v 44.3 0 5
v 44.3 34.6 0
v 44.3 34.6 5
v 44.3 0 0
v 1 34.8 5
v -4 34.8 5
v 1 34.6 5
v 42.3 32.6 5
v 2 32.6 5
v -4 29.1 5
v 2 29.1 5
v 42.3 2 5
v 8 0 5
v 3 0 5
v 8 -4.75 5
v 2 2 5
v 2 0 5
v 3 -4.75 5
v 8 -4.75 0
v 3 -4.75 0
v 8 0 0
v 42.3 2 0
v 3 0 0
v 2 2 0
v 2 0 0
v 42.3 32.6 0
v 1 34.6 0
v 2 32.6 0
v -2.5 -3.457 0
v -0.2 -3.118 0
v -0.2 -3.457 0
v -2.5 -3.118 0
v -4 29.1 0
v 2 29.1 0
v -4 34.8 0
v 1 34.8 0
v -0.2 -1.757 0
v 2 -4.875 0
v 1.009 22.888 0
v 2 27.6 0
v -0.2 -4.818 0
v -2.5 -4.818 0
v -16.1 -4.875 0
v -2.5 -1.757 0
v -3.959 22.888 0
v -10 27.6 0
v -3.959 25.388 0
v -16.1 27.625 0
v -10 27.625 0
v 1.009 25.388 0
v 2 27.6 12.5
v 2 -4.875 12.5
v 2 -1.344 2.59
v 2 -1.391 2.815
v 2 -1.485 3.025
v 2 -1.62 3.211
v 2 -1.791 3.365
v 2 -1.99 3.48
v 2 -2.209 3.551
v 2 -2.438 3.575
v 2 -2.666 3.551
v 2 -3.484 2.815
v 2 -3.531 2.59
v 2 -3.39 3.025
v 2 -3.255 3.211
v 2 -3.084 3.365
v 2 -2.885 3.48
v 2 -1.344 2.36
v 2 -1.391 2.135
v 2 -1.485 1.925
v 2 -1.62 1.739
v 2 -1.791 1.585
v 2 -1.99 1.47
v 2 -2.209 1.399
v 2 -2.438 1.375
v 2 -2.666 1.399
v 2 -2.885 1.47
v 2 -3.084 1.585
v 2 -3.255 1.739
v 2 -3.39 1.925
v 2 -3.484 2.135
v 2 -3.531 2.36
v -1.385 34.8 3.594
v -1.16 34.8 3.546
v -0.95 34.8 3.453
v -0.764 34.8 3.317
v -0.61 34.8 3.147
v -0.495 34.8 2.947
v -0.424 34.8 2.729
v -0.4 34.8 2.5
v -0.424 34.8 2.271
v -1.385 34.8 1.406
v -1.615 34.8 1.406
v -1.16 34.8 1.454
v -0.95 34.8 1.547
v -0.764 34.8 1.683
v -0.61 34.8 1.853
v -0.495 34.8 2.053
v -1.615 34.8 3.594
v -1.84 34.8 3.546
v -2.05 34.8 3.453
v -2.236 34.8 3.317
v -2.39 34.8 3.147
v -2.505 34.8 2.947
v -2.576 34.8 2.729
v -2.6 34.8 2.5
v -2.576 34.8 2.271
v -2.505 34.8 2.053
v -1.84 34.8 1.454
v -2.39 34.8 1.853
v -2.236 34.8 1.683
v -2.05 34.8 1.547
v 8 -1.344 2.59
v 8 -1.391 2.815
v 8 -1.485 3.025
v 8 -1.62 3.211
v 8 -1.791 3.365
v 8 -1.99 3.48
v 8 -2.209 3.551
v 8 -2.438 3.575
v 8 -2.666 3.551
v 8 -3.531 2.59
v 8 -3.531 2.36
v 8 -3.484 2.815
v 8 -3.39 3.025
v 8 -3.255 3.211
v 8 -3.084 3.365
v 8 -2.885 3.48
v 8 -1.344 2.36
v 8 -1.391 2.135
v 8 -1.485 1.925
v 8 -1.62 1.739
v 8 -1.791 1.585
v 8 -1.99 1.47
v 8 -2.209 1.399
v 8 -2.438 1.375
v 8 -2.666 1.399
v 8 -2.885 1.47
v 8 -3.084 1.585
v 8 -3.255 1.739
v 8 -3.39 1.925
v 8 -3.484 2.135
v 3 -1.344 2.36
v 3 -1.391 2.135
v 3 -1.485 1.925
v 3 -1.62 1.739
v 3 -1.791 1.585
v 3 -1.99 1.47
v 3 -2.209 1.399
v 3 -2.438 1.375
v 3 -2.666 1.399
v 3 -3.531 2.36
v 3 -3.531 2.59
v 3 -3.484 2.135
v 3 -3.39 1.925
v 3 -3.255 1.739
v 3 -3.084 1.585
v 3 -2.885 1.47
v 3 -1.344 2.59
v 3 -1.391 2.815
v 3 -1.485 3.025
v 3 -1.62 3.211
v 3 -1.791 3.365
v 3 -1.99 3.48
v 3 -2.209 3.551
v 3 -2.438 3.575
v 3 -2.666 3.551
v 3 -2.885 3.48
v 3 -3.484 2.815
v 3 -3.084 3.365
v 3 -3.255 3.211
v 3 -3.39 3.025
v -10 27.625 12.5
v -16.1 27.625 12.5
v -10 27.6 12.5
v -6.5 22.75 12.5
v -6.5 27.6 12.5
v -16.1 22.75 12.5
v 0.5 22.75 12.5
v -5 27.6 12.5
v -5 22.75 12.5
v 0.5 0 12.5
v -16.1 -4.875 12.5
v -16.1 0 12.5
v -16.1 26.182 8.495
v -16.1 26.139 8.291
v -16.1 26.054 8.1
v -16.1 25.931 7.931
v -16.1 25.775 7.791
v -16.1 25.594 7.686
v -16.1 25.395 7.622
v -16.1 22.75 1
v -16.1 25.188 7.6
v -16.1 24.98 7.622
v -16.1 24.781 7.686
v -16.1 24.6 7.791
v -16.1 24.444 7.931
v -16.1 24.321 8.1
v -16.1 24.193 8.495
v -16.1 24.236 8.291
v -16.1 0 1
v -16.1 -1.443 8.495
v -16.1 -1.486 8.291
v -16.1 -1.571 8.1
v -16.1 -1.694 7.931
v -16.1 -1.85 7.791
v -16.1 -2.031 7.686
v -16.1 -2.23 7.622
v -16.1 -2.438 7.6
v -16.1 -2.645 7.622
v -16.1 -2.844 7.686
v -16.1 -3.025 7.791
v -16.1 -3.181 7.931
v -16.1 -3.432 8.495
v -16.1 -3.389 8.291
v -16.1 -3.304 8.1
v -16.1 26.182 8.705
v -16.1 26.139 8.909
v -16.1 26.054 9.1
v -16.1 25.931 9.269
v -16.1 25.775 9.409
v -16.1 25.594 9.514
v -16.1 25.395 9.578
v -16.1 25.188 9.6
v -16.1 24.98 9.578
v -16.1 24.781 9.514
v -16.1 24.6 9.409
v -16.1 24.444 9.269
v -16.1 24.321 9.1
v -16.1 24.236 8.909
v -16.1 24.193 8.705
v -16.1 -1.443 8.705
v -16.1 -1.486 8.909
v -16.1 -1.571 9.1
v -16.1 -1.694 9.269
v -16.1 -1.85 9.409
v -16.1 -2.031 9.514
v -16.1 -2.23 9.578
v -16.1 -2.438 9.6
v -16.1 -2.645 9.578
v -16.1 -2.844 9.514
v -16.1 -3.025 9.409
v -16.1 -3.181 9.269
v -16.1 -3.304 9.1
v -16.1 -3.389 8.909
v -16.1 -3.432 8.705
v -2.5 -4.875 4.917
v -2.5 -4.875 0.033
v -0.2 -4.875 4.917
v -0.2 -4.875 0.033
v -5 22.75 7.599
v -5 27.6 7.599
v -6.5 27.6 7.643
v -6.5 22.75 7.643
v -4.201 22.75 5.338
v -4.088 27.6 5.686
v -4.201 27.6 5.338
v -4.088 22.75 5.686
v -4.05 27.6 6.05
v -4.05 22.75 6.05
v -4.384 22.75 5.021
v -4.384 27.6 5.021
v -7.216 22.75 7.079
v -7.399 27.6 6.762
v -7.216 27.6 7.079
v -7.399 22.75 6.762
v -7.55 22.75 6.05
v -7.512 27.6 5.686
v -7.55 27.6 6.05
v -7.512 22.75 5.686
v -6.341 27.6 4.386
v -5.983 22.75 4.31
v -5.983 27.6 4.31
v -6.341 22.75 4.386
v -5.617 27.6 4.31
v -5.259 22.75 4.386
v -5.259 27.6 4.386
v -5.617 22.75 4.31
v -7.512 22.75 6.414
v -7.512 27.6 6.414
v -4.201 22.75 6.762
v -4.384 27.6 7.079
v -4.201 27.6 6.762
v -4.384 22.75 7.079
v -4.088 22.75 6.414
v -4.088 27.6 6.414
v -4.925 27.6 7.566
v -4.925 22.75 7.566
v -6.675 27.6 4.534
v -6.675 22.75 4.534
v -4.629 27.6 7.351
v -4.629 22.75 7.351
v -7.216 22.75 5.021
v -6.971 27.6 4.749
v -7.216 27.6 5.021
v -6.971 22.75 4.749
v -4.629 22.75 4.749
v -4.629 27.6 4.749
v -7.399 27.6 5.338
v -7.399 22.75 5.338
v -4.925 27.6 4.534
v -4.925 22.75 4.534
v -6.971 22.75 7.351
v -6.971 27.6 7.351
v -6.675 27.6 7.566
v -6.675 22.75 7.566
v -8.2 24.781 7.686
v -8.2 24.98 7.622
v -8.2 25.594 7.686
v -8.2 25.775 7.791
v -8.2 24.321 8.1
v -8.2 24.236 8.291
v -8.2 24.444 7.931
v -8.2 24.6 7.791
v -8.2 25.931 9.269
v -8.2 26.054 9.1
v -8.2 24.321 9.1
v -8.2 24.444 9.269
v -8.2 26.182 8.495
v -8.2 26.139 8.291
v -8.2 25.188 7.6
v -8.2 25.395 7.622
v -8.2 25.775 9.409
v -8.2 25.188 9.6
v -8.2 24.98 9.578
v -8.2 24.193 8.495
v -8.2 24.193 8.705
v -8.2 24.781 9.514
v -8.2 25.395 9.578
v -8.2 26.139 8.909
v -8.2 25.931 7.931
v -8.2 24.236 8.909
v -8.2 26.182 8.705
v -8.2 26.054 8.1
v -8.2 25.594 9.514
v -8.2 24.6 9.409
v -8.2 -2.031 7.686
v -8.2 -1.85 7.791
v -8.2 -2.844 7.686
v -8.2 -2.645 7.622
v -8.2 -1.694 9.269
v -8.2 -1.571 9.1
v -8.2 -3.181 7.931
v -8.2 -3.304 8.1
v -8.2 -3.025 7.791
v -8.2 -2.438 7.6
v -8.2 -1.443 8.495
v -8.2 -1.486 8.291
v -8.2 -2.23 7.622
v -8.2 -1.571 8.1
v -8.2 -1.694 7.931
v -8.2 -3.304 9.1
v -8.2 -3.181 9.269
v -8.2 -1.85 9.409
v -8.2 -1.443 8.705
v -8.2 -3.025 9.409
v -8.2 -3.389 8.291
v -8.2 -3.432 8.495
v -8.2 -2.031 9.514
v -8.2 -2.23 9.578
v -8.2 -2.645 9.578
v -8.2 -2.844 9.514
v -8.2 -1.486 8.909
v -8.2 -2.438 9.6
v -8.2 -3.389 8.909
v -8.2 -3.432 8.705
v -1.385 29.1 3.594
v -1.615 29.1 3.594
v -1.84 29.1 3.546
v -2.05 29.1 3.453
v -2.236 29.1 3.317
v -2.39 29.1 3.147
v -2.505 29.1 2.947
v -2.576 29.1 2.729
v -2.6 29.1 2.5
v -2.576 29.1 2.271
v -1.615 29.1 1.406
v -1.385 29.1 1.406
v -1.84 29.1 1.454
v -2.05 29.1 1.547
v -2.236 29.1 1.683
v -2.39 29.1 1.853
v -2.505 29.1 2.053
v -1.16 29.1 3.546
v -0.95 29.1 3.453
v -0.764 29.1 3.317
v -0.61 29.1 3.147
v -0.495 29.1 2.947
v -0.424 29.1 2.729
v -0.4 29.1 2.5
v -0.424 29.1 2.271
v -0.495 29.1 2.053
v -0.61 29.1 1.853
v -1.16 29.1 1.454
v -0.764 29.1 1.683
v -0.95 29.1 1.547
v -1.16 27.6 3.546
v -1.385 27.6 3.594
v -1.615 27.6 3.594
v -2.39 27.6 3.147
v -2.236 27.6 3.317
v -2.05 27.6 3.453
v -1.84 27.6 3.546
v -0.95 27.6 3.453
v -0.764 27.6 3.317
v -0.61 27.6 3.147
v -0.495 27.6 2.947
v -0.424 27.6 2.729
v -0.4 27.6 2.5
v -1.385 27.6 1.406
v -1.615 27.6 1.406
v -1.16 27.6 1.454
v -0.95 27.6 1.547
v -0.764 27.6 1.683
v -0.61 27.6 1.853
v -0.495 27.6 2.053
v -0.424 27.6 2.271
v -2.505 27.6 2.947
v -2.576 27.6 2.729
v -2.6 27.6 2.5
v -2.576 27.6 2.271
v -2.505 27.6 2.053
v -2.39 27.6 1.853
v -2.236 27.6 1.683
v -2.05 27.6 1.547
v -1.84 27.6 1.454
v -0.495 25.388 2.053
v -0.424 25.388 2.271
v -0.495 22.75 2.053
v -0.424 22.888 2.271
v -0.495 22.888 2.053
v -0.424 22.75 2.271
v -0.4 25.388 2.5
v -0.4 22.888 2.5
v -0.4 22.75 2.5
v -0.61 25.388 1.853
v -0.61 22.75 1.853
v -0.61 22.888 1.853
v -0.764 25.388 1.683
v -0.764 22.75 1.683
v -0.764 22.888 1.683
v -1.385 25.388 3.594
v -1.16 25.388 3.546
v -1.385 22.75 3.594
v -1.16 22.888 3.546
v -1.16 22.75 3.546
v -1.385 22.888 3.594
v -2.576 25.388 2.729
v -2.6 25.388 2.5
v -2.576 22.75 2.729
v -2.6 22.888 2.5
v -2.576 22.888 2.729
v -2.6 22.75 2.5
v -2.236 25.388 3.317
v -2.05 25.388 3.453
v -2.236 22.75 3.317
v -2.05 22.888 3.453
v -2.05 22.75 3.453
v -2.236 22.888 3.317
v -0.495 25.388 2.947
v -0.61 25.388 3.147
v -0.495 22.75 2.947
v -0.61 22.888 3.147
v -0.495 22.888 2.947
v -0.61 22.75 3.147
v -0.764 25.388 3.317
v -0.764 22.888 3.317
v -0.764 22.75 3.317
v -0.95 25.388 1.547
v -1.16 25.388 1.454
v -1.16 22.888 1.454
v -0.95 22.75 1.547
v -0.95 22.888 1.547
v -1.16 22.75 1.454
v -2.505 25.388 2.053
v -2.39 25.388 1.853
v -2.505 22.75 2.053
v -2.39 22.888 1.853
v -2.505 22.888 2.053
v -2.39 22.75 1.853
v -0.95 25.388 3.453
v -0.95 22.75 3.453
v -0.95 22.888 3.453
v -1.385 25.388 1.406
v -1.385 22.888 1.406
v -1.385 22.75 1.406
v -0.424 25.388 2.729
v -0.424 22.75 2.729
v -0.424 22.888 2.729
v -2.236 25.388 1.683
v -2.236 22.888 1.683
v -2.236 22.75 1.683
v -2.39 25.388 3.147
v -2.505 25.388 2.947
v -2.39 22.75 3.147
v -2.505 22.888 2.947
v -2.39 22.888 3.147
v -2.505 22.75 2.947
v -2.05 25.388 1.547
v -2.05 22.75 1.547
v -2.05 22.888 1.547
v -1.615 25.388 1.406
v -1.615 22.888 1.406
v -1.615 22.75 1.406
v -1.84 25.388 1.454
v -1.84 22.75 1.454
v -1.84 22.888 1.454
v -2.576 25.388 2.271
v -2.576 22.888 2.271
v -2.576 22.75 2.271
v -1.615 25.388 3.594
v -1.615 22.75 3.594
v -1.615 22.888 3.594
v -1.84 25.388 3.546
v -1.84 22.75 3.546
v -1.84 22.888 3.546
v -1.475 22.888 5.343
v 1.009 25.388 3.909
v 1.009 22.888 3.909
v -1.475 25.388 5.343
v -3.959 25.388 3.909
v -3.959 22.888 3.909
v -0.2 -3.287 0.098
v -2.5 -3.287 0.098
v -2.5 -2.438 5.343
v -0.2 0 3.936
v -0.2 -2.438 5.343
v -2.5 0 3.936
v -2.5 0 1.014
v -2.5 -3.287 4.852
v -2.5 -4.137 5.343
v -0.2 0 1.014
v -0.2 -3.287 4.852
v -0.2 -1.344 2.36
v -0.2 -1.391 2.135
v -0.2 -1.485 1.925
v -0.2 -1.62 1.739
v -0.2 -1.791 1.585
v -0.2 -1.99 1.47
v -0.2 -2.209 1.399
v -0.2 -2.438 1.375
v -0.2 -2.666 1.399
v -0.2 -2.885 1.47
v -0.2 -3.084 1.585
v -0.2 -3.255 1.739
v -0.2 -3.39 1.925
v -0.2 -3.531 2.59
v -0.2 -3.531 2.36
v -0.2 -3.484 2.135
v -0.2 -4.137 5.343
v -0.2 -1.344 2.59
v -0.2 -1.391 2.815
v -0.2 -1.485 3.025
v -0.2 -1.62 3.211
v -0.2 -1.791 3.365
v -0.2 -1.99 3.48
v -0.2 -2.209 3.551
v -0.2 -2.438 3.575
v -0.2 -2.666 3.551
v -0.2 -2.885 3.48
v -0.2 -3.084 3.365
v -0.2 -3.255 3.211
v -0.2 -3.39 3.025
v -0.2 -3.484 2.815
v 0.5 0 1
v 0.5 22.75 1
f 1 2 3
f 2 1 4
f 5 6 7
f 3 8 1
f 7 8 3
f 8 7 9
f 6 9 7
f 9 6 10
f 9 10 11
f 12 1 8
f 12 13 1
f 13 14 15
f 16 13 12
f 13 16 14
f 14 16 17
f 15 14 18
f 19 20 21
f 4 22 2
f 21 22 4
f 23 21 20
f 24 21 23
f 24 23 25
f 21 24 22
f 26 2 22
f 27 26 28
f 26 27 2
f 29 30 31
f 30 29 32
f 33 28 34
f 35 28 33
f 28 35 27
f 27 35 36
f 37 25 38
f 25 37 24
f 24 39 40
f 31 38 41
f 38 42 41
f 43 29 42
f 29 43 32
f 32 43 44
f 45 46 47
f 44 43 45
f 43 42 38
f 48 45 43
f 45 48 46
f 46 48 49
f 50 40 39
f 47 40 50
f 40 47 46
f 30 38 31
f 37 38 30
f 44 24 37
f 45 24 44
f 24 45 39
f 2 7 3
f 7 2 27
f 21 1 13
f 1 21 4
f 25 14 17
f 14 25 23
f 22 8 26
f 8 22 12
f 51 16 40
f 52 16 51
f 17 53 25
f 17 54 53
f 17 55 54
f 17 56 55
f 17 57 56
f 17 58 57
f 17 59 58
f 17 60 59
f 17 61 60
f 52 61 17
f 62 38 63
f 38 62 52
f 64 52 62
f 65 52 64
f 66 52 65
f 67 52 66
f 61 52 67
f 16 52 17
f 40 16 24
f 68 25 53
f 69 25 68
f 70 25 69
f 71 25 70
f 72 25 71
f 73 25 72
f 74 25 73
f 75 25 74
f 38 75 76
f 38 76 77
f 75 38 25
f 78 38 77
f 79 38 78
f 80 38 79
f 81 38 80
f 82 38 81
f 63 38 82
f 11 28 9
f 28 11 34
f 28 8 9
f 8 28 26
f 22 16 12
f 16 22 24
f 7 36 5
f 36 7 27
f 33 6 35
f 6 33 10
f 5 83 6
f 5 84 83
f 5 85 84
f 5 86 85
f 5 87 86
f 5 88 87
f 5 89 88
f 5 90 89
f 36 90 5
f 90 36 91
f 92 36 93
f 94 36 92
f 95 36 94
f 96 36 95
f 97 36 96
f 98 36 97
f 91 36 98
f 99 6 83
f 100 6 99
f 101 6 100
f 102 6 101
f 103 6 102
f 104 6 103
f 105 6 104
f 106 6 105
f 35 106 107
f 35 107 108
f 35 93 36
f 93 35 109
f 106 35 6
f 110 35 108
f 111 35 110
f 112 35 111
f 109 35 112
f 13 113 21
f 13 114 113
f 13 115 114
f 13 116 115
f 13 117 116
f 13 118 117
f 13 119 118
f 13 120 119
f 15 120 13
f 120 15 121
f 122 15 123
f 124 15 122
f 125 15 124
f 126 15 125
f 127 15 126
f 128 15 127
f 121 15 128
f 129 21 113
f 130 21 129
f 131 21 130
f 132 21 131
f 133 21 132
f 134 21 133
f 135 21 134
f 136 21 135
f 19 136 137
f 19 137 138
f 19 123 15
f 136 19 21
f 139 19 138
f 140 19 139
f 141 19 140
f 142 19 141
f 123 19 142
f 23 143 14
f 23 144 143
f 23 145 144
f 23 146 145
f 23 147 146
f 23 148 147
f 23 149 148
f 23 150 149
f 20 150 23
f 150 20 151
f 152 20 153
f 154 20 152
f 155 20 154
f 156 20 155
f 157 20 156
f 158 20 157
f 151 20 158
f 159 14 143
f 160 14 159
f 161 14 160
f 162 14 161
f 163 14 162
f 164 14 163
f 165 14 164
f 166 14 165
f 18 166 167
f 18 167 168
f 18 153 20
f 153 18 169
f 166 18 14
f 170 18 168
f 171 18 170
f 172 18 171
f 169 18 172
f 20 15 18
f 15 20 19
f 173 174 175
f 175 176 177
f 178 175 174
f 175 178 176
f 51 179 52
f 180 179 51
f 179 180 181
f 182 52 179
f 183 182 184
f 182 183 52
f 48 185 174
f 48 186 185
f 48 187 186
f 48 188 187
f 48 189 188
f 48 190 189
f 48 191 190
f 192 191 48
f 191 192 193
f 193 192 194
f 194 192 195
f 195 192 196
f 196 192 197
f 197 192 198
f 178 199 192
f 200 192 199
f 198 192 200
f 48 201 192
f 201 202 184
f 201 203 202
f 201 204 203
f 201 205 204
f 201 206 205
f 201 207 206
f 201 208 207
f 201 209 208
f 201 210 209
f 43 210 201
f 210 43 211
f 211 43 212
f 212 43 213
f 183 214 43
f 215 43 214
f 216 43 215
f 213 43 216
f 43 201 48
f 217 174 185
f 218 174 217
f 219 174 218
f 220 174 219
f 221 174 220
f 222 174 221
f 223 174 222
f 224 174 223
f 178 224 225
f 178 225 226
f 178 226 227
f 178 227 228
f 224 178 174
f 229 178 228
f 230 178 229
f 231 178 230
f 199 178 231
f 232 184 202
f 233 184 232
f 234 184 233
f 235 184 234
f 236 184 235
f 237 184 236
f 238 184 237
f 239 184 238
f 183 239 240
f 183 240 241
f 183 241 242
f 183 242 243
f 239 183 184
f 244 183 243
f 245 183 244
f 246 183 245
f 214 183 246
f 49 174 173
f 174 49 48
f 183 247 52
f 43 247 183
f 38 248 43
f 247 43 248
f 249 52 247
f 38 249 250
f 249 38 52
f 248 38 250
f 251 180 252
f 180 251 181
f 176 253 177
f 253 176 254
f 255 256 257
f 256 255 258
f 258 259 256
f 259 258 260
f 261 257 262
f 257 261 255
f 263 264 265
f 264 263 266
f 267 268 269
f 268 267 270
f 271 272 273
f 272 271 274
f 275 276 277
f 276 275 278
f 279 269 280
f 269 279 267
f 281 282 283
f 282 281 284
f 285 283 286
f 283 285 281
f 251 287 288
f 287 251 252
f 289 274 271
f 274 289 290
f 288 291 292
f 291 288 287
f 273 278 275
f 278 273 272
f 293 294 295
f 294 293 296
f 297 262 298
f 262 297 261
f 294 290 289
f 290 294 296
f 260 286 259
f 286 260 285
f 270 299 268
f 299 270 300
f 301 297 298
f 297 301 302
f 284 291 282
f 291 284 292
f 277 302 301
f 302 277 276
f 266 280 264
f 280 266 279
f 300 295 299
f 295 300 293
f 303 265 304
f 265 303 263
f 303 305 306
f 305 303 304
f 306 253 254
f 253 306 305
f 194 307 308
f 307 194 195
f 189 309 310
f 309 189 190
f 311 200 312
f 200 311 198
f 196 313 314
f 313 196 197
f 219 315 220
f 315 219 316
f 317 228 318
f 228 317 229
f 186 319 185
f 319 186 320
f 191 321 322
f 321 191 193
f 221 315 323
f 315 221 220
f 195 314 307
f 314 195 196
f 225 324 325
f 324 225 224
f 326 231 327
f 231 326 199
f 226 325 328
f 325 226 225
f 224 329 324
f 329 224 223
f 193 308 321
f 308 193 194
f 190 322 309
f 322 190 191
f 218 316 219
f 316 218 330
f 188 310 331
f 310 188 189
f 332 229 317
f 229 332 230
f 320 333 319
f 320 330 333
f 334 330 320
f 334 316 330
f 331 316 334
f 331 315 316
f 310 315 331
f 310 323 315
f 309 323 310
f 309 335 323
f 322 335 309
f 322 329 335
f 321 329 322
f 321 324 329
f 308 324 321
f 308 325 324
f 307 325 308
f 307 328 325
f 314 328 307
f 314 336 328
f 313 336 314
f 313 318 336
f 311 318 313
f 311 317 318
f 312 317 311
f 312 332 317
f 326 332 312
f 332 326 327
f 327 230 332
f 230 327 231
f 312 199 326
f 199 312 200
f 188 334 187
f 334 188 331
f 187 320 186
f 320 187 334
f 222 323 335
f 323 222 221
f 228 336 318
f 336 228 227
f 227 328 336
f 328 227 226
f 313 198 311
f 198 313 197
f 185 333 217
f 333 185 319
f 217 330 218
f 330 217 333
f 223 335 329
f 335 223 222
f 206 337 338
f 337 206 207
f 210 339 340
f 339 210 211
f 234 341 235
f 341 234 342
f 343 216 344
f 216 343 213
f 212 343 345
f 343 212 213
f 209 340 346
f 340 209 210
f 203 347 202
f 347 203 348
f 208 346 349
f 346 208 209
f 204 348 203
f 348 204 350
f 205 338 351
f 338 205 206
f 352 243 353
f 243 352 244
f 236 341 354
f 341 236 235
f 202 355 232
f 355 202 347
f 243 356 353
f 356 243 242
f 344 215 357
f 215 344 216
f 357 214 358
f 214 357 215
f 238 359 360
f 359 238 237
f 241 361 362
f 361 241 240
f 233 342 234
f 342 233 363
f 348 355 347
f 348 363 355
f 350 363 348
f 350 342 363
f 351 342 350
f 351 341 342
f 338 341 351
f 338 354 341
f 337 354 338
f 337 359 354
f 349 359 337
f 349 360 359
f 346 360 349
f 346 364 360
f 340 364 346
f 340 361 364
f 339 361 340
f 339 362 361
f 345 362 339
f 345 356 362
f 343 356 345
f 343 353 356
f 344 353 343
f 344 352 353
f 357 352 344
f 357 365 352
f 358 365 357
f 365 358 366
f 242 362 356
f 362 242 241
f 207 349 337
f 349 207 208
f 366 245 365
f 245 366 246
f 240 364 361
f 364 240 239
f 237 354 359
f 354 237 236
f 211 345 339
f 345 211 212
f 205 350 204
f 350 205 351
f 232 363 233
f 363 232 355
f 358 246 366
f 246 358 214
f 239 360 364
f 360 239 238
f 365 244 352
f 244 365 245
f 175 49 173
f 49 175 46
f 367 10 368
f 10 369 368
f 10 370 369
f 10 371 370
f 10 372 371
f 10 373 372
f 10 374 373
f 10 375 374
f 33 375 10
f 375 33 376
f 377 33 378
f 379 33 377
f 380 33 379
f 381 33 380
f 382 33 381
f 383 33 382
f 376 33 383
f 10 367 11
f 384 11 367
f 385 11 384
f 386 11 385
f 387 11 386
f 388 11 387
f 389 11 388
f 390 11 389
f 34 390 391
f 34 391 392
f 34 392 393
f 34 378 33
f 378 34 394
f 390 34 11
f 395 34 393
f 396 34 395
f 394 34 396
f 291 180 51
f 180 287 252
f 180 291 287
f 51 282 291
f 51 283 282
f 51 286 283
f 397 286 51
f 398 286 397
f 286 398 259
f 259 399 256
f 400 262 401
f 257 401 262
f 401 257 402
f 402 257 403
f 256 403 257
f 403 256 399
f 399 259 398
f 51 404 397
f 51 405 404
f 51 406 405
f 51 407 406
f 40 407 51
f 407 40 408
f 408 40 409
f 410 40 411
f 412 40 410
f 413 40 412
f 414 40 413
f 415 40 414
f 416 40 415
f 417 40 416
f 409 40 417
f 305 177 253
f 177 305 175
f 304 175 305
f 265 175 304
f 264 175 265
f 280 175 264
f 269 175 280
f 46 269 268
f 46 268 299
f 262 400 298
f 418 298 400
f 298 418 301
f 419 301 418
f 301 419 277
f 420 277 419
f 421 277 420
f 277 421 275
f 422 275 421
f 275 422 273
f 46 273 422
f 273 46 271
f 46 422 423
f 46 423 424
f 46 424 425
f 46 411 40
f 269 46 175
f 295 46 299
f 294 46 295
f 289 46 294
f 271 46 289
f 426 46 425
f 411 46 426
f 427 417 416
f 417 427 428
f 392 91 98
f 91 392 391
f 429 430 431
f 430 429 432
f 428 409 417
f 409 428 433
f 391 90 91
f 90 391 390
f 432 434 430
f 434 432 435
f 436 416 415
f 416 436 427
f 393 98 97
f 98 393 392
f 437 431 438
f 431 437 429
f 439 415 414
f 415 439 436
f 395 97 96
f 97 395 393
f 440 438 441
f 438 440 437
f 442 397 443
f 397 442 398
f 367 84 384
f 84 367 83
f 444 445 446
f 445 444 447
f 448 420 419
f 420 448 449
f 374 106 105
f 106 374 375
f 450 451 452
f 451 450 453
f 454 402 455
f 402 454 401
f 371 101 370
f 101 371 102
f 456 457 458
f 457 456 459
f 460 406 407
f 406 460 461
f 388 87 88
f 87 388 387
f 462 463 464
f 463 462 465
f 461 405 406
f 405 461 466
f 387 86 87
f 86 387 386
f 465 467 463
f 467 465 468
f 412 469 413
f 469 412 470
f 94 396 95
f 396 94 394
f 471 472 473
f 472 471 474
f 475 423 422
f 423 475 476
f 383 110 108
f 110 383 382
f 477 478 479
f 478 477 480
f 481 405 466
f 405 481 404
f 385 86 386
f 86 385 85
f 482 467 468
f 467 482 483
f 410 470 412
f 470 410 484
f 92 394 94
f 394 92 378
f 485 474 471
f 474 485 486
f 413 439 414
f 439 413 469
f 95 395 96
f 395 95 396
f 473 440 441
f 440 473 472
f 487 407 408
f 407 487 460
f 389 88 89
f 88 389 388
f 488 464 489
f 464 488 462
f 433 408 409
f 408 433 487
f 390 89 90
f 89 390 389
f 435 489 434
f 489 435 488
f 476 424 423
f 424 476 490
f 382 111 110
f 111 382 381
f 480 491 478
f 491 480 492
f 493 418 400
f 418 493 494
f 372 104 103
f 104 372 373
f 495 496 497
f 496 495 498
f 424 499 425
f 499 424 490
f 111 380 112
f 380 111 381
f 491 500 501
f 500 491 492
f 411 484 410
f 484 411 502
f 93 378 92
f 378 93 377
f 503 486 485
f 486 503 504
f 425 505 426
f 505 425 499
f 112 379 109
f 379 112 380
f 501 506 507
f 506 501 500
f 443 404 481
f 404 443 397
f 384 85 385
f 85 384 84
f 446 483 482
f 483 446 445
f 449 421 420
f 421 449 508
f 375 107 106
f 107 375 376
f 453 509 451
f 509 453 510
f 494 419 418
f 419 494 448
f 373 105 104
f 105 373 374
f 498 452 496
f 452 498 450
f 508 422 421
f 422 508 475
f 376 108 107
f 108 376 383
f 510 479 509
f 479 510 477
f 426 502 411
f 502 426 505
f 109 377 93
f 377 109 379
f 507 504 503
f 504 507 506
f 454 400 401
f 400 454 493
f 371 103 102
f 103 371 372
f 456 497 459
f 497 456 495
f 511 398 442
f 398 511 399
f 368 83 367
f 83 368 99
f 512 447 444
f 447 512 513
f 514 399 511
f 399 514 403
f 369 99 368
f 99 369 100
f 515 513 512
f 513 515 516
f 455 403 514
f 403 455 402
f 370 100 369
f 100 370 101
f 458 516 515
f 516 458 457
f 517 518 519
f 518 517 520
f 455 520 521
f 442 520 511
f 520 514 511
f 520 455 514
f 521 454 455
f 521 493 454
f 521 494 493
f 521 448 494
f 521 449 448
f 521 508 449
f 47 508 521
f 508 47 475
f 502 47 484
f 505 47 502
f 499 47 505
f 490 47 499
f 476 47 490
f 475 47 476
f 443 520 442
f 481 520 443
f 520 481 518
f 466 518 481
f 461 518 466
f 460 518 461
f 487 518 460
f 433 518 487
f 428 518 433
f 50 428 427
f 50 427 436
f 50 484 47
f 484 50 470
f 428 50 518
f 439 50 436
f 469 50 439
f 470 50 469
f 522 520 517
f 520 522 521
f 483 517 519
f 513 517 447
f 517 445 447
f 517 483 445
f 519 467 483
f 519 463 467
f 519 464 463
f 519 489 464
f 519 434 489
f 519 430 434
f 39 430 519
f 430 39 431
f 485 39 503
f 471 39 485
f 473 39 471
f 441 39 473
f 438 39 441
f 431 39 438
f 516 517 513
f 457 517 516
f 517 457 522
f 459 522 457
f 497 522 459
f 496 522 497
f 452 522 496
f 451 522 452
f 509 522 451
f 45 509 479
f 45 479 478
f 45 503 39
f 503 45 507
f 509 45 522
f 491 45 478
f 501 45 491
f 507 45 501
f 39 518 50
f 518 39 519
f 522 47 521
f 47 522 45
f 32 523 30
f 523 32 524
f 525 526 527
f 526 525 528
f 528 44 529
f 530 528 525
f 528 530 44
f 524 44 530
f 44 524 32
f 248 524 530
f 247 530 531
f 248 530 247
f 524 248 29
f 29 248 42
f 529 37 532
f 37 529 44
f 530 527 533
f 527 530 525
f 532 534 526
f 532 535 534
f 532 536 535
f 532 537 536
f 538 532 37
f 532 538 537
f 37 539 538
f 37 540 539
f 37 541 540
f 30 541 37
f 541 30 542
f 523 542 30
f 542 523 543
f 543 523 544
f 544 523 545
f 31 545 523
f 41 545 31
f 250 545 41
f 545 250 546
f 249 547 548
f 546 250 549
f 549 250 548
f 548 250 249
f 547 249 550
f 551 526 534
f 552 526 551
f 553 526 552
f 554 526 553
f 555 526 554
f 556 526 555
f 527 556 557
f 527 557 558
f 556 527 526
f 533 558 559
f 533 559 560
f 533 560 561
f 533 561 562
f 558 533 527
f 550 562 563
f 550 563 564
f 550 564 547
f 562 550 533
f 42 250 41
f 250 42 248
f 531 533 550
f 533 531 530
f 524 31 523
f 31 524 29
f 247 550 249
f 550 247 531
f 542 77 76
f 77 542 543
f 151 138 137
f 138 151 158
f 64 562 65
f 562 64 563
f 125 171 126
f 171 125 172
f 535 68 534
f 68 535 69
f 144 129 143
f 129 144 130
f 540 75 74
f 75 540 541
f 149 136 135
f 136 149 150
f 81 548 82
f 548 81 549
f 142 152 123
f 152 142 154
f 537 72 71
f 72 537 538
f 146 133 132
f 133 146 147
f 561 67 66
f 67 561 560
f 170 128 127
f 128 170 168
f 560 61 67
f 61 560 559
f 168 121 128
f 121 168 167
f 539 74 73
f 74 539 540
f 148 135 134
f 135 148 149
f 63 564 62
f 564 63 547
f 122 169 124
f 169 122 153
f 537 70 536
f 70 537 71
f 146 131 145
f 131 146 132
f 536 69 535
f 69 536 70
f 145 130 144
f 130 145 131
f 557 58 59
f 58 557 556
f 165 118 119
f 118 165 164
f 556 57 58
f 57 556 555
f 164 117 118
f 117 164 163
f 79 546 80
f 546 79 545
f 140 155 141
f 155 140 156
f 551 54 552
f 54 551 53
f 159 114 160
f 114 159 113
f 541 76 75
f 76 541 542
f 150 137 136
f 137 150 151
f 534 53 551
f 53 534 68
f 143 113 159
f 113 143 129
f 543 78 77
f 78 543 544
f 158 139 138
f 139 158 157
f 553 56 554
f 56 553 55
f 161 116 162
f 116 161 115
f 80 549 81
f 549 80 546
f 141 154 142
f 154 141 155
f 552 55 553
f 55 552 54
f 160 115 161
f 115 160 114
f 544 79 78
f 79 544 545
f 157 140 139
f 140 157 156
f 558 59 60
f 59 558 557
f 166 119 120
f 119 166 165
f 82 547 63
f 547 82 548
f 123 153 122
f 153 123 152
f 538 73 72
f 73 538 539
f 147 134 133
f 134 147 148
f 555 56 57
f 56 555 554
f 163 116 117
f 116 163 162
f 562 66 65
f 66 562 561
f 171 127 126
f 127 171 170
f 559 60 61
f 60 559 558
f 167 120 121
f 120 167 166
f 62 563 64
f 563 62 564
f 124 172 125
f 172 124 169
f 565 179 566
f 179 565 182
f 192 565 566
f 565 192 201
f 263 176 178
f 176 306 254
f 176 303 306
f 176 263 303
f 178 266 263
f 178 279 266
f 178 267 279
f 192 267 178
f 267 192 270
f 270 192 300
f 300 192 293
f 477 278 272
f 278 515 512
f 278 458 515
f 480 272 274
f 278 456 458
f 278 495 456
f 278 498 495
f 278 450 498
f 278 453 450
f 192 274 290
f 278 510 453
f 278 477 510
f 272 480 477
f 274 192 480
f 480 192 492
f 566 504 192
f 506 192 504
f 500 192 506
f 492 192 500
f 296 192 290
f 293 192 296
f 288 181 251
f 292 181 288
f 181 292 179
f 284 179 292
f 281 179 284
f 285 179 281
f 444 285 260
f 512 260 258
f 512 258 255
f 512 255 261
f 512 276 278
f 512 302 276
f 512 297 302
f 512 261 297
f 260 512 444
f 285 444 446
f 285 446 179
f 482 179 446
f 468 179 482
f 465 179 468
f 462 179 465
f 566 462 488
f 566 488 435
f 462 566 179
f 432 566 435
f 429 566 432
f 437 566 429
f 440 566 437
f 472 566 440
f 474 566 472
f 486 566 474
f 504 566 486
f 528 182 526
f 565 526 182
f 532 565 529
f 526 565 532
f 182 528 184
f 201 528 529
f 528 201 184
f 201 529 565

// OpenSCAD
tol=.3;
hX=40.0;
hY=30.3;
hZ=5;
th=2;
bth=4;
brktX = 15;
//brktHt = 8.7;
brktLen=39-7;

yZ = 12.5;
yY = 32.5;
yX = 18.1; //15.4;

ycY= 22.65+.1;


screwDia = 2;
screwDiaClamp=2.2;
servoW = 12.4;
cutR = servoW*.30;

nut_w_flats=4.95;
nut_th = 2;
nut_trap_r = nut_w_flats/2/cos(180/6) +.01;



difference(){
  union(){
    translate([-bth,(hY-5.5),0])
      cube([hZ,10,hZ]);

    translate([3,-(yY-ycY)+5,0])
      cube([hZ,5,hZ]);

    batteryClamp();

    translate([-yX+bth/2,-(yY-ycY)/2,0])
      cube([yX,yY,yZ]);

  }

  //servo wire cutouts
    translate([-6.5,ycY-.3,yZ/2])
      cube([1.5,6,25]);

    translate([-5.8,ycY-.3,yZ/2-.2])
      rotate([270,0,0])
      cylinder(d=3.5,h=15,$fn=30);

  //screw hole servo
    translate([-yX-.1,ycY+(yY-ycY)/4,8.6])
      rotate([0,90,0])
      cylinder(d=screwDia,h=10,$fn=30);

  //screw hole servo
  translate([-yX-.1,-(yY-ycY)/4,8.6])
    rotate([0,90,0])
    cylinder(d=screwDia,h=10,$fn=30);
    
  //clamp cutout
  translate([-10,27.6,-.1])
    cube([25,1.5,25]);
      
  //clamp screw hole
  translate([-bth/2+.5,ycY-(yY-ycY)/4,hZ/2])
    rotate([270,0,0])
    cylinder(d=screwDiaClamp,h=16,$fn=30);
      
  //nut trap
  color("purple")
    translate([-nut_w_flats/2+1,.2+ ycY+(yY-ycY)/4,nut_w_flats/2])
    rotate([90,30,0])
    cylinder(h=nut_th*1.25,r1=nut_trap_r, r2=nut_trap_r,$fn=6);

    translate([-nut_w_flats/2+1,.2+ ycY+(yY-ycY)/4,nut_w_flats/4])
      rotate([90,30,0])
      cylinder(h=nut_th*1.25,r1=nut_trap_r, r2=nut_trap_r,$fn=6);      


  //nut trap
  color("purple")
    translate([-2.5,-(yY-ycY)/4,nut_w_flats/2])
    rotate([0,90,0])
    cylinder(h=nut_th*1.15,r1=nut_trap_r, r2=nut_trap_r,$fn=6);
      
  translate([-2.5,-(yY-ycY)/4-1.7,nut_w_flats/2])
    rotate([0,90,0])
    cylinder(h=nut_th*1.15,r1=nut_trap_r, r2=nut_trap_r,$fn=6);
   
  //clamp screw hole
   translate([-2.5,-(yY-ycY)/4,nut_w_flats/2])
    rotate([0,90,0])
    cylinder(d=screwDiaClamp,h=35,$fn=30); 
      
        
  //cutout
  translate([-yX+bth/2-1.5,0,1])
  cube([yX,ycY,yZ+.1]);
}

module batteryClamp() {
difference(){
  //outside battery edge
 color ("blue") 
  cube([hX+bth+tol,hY+bth+tol,hZ]);
 
  //battery hole
  color ("red") 
    translate([bth/2,bth/2,0])
    cube([hX+tol,hY+tol,hZ]);
}}
